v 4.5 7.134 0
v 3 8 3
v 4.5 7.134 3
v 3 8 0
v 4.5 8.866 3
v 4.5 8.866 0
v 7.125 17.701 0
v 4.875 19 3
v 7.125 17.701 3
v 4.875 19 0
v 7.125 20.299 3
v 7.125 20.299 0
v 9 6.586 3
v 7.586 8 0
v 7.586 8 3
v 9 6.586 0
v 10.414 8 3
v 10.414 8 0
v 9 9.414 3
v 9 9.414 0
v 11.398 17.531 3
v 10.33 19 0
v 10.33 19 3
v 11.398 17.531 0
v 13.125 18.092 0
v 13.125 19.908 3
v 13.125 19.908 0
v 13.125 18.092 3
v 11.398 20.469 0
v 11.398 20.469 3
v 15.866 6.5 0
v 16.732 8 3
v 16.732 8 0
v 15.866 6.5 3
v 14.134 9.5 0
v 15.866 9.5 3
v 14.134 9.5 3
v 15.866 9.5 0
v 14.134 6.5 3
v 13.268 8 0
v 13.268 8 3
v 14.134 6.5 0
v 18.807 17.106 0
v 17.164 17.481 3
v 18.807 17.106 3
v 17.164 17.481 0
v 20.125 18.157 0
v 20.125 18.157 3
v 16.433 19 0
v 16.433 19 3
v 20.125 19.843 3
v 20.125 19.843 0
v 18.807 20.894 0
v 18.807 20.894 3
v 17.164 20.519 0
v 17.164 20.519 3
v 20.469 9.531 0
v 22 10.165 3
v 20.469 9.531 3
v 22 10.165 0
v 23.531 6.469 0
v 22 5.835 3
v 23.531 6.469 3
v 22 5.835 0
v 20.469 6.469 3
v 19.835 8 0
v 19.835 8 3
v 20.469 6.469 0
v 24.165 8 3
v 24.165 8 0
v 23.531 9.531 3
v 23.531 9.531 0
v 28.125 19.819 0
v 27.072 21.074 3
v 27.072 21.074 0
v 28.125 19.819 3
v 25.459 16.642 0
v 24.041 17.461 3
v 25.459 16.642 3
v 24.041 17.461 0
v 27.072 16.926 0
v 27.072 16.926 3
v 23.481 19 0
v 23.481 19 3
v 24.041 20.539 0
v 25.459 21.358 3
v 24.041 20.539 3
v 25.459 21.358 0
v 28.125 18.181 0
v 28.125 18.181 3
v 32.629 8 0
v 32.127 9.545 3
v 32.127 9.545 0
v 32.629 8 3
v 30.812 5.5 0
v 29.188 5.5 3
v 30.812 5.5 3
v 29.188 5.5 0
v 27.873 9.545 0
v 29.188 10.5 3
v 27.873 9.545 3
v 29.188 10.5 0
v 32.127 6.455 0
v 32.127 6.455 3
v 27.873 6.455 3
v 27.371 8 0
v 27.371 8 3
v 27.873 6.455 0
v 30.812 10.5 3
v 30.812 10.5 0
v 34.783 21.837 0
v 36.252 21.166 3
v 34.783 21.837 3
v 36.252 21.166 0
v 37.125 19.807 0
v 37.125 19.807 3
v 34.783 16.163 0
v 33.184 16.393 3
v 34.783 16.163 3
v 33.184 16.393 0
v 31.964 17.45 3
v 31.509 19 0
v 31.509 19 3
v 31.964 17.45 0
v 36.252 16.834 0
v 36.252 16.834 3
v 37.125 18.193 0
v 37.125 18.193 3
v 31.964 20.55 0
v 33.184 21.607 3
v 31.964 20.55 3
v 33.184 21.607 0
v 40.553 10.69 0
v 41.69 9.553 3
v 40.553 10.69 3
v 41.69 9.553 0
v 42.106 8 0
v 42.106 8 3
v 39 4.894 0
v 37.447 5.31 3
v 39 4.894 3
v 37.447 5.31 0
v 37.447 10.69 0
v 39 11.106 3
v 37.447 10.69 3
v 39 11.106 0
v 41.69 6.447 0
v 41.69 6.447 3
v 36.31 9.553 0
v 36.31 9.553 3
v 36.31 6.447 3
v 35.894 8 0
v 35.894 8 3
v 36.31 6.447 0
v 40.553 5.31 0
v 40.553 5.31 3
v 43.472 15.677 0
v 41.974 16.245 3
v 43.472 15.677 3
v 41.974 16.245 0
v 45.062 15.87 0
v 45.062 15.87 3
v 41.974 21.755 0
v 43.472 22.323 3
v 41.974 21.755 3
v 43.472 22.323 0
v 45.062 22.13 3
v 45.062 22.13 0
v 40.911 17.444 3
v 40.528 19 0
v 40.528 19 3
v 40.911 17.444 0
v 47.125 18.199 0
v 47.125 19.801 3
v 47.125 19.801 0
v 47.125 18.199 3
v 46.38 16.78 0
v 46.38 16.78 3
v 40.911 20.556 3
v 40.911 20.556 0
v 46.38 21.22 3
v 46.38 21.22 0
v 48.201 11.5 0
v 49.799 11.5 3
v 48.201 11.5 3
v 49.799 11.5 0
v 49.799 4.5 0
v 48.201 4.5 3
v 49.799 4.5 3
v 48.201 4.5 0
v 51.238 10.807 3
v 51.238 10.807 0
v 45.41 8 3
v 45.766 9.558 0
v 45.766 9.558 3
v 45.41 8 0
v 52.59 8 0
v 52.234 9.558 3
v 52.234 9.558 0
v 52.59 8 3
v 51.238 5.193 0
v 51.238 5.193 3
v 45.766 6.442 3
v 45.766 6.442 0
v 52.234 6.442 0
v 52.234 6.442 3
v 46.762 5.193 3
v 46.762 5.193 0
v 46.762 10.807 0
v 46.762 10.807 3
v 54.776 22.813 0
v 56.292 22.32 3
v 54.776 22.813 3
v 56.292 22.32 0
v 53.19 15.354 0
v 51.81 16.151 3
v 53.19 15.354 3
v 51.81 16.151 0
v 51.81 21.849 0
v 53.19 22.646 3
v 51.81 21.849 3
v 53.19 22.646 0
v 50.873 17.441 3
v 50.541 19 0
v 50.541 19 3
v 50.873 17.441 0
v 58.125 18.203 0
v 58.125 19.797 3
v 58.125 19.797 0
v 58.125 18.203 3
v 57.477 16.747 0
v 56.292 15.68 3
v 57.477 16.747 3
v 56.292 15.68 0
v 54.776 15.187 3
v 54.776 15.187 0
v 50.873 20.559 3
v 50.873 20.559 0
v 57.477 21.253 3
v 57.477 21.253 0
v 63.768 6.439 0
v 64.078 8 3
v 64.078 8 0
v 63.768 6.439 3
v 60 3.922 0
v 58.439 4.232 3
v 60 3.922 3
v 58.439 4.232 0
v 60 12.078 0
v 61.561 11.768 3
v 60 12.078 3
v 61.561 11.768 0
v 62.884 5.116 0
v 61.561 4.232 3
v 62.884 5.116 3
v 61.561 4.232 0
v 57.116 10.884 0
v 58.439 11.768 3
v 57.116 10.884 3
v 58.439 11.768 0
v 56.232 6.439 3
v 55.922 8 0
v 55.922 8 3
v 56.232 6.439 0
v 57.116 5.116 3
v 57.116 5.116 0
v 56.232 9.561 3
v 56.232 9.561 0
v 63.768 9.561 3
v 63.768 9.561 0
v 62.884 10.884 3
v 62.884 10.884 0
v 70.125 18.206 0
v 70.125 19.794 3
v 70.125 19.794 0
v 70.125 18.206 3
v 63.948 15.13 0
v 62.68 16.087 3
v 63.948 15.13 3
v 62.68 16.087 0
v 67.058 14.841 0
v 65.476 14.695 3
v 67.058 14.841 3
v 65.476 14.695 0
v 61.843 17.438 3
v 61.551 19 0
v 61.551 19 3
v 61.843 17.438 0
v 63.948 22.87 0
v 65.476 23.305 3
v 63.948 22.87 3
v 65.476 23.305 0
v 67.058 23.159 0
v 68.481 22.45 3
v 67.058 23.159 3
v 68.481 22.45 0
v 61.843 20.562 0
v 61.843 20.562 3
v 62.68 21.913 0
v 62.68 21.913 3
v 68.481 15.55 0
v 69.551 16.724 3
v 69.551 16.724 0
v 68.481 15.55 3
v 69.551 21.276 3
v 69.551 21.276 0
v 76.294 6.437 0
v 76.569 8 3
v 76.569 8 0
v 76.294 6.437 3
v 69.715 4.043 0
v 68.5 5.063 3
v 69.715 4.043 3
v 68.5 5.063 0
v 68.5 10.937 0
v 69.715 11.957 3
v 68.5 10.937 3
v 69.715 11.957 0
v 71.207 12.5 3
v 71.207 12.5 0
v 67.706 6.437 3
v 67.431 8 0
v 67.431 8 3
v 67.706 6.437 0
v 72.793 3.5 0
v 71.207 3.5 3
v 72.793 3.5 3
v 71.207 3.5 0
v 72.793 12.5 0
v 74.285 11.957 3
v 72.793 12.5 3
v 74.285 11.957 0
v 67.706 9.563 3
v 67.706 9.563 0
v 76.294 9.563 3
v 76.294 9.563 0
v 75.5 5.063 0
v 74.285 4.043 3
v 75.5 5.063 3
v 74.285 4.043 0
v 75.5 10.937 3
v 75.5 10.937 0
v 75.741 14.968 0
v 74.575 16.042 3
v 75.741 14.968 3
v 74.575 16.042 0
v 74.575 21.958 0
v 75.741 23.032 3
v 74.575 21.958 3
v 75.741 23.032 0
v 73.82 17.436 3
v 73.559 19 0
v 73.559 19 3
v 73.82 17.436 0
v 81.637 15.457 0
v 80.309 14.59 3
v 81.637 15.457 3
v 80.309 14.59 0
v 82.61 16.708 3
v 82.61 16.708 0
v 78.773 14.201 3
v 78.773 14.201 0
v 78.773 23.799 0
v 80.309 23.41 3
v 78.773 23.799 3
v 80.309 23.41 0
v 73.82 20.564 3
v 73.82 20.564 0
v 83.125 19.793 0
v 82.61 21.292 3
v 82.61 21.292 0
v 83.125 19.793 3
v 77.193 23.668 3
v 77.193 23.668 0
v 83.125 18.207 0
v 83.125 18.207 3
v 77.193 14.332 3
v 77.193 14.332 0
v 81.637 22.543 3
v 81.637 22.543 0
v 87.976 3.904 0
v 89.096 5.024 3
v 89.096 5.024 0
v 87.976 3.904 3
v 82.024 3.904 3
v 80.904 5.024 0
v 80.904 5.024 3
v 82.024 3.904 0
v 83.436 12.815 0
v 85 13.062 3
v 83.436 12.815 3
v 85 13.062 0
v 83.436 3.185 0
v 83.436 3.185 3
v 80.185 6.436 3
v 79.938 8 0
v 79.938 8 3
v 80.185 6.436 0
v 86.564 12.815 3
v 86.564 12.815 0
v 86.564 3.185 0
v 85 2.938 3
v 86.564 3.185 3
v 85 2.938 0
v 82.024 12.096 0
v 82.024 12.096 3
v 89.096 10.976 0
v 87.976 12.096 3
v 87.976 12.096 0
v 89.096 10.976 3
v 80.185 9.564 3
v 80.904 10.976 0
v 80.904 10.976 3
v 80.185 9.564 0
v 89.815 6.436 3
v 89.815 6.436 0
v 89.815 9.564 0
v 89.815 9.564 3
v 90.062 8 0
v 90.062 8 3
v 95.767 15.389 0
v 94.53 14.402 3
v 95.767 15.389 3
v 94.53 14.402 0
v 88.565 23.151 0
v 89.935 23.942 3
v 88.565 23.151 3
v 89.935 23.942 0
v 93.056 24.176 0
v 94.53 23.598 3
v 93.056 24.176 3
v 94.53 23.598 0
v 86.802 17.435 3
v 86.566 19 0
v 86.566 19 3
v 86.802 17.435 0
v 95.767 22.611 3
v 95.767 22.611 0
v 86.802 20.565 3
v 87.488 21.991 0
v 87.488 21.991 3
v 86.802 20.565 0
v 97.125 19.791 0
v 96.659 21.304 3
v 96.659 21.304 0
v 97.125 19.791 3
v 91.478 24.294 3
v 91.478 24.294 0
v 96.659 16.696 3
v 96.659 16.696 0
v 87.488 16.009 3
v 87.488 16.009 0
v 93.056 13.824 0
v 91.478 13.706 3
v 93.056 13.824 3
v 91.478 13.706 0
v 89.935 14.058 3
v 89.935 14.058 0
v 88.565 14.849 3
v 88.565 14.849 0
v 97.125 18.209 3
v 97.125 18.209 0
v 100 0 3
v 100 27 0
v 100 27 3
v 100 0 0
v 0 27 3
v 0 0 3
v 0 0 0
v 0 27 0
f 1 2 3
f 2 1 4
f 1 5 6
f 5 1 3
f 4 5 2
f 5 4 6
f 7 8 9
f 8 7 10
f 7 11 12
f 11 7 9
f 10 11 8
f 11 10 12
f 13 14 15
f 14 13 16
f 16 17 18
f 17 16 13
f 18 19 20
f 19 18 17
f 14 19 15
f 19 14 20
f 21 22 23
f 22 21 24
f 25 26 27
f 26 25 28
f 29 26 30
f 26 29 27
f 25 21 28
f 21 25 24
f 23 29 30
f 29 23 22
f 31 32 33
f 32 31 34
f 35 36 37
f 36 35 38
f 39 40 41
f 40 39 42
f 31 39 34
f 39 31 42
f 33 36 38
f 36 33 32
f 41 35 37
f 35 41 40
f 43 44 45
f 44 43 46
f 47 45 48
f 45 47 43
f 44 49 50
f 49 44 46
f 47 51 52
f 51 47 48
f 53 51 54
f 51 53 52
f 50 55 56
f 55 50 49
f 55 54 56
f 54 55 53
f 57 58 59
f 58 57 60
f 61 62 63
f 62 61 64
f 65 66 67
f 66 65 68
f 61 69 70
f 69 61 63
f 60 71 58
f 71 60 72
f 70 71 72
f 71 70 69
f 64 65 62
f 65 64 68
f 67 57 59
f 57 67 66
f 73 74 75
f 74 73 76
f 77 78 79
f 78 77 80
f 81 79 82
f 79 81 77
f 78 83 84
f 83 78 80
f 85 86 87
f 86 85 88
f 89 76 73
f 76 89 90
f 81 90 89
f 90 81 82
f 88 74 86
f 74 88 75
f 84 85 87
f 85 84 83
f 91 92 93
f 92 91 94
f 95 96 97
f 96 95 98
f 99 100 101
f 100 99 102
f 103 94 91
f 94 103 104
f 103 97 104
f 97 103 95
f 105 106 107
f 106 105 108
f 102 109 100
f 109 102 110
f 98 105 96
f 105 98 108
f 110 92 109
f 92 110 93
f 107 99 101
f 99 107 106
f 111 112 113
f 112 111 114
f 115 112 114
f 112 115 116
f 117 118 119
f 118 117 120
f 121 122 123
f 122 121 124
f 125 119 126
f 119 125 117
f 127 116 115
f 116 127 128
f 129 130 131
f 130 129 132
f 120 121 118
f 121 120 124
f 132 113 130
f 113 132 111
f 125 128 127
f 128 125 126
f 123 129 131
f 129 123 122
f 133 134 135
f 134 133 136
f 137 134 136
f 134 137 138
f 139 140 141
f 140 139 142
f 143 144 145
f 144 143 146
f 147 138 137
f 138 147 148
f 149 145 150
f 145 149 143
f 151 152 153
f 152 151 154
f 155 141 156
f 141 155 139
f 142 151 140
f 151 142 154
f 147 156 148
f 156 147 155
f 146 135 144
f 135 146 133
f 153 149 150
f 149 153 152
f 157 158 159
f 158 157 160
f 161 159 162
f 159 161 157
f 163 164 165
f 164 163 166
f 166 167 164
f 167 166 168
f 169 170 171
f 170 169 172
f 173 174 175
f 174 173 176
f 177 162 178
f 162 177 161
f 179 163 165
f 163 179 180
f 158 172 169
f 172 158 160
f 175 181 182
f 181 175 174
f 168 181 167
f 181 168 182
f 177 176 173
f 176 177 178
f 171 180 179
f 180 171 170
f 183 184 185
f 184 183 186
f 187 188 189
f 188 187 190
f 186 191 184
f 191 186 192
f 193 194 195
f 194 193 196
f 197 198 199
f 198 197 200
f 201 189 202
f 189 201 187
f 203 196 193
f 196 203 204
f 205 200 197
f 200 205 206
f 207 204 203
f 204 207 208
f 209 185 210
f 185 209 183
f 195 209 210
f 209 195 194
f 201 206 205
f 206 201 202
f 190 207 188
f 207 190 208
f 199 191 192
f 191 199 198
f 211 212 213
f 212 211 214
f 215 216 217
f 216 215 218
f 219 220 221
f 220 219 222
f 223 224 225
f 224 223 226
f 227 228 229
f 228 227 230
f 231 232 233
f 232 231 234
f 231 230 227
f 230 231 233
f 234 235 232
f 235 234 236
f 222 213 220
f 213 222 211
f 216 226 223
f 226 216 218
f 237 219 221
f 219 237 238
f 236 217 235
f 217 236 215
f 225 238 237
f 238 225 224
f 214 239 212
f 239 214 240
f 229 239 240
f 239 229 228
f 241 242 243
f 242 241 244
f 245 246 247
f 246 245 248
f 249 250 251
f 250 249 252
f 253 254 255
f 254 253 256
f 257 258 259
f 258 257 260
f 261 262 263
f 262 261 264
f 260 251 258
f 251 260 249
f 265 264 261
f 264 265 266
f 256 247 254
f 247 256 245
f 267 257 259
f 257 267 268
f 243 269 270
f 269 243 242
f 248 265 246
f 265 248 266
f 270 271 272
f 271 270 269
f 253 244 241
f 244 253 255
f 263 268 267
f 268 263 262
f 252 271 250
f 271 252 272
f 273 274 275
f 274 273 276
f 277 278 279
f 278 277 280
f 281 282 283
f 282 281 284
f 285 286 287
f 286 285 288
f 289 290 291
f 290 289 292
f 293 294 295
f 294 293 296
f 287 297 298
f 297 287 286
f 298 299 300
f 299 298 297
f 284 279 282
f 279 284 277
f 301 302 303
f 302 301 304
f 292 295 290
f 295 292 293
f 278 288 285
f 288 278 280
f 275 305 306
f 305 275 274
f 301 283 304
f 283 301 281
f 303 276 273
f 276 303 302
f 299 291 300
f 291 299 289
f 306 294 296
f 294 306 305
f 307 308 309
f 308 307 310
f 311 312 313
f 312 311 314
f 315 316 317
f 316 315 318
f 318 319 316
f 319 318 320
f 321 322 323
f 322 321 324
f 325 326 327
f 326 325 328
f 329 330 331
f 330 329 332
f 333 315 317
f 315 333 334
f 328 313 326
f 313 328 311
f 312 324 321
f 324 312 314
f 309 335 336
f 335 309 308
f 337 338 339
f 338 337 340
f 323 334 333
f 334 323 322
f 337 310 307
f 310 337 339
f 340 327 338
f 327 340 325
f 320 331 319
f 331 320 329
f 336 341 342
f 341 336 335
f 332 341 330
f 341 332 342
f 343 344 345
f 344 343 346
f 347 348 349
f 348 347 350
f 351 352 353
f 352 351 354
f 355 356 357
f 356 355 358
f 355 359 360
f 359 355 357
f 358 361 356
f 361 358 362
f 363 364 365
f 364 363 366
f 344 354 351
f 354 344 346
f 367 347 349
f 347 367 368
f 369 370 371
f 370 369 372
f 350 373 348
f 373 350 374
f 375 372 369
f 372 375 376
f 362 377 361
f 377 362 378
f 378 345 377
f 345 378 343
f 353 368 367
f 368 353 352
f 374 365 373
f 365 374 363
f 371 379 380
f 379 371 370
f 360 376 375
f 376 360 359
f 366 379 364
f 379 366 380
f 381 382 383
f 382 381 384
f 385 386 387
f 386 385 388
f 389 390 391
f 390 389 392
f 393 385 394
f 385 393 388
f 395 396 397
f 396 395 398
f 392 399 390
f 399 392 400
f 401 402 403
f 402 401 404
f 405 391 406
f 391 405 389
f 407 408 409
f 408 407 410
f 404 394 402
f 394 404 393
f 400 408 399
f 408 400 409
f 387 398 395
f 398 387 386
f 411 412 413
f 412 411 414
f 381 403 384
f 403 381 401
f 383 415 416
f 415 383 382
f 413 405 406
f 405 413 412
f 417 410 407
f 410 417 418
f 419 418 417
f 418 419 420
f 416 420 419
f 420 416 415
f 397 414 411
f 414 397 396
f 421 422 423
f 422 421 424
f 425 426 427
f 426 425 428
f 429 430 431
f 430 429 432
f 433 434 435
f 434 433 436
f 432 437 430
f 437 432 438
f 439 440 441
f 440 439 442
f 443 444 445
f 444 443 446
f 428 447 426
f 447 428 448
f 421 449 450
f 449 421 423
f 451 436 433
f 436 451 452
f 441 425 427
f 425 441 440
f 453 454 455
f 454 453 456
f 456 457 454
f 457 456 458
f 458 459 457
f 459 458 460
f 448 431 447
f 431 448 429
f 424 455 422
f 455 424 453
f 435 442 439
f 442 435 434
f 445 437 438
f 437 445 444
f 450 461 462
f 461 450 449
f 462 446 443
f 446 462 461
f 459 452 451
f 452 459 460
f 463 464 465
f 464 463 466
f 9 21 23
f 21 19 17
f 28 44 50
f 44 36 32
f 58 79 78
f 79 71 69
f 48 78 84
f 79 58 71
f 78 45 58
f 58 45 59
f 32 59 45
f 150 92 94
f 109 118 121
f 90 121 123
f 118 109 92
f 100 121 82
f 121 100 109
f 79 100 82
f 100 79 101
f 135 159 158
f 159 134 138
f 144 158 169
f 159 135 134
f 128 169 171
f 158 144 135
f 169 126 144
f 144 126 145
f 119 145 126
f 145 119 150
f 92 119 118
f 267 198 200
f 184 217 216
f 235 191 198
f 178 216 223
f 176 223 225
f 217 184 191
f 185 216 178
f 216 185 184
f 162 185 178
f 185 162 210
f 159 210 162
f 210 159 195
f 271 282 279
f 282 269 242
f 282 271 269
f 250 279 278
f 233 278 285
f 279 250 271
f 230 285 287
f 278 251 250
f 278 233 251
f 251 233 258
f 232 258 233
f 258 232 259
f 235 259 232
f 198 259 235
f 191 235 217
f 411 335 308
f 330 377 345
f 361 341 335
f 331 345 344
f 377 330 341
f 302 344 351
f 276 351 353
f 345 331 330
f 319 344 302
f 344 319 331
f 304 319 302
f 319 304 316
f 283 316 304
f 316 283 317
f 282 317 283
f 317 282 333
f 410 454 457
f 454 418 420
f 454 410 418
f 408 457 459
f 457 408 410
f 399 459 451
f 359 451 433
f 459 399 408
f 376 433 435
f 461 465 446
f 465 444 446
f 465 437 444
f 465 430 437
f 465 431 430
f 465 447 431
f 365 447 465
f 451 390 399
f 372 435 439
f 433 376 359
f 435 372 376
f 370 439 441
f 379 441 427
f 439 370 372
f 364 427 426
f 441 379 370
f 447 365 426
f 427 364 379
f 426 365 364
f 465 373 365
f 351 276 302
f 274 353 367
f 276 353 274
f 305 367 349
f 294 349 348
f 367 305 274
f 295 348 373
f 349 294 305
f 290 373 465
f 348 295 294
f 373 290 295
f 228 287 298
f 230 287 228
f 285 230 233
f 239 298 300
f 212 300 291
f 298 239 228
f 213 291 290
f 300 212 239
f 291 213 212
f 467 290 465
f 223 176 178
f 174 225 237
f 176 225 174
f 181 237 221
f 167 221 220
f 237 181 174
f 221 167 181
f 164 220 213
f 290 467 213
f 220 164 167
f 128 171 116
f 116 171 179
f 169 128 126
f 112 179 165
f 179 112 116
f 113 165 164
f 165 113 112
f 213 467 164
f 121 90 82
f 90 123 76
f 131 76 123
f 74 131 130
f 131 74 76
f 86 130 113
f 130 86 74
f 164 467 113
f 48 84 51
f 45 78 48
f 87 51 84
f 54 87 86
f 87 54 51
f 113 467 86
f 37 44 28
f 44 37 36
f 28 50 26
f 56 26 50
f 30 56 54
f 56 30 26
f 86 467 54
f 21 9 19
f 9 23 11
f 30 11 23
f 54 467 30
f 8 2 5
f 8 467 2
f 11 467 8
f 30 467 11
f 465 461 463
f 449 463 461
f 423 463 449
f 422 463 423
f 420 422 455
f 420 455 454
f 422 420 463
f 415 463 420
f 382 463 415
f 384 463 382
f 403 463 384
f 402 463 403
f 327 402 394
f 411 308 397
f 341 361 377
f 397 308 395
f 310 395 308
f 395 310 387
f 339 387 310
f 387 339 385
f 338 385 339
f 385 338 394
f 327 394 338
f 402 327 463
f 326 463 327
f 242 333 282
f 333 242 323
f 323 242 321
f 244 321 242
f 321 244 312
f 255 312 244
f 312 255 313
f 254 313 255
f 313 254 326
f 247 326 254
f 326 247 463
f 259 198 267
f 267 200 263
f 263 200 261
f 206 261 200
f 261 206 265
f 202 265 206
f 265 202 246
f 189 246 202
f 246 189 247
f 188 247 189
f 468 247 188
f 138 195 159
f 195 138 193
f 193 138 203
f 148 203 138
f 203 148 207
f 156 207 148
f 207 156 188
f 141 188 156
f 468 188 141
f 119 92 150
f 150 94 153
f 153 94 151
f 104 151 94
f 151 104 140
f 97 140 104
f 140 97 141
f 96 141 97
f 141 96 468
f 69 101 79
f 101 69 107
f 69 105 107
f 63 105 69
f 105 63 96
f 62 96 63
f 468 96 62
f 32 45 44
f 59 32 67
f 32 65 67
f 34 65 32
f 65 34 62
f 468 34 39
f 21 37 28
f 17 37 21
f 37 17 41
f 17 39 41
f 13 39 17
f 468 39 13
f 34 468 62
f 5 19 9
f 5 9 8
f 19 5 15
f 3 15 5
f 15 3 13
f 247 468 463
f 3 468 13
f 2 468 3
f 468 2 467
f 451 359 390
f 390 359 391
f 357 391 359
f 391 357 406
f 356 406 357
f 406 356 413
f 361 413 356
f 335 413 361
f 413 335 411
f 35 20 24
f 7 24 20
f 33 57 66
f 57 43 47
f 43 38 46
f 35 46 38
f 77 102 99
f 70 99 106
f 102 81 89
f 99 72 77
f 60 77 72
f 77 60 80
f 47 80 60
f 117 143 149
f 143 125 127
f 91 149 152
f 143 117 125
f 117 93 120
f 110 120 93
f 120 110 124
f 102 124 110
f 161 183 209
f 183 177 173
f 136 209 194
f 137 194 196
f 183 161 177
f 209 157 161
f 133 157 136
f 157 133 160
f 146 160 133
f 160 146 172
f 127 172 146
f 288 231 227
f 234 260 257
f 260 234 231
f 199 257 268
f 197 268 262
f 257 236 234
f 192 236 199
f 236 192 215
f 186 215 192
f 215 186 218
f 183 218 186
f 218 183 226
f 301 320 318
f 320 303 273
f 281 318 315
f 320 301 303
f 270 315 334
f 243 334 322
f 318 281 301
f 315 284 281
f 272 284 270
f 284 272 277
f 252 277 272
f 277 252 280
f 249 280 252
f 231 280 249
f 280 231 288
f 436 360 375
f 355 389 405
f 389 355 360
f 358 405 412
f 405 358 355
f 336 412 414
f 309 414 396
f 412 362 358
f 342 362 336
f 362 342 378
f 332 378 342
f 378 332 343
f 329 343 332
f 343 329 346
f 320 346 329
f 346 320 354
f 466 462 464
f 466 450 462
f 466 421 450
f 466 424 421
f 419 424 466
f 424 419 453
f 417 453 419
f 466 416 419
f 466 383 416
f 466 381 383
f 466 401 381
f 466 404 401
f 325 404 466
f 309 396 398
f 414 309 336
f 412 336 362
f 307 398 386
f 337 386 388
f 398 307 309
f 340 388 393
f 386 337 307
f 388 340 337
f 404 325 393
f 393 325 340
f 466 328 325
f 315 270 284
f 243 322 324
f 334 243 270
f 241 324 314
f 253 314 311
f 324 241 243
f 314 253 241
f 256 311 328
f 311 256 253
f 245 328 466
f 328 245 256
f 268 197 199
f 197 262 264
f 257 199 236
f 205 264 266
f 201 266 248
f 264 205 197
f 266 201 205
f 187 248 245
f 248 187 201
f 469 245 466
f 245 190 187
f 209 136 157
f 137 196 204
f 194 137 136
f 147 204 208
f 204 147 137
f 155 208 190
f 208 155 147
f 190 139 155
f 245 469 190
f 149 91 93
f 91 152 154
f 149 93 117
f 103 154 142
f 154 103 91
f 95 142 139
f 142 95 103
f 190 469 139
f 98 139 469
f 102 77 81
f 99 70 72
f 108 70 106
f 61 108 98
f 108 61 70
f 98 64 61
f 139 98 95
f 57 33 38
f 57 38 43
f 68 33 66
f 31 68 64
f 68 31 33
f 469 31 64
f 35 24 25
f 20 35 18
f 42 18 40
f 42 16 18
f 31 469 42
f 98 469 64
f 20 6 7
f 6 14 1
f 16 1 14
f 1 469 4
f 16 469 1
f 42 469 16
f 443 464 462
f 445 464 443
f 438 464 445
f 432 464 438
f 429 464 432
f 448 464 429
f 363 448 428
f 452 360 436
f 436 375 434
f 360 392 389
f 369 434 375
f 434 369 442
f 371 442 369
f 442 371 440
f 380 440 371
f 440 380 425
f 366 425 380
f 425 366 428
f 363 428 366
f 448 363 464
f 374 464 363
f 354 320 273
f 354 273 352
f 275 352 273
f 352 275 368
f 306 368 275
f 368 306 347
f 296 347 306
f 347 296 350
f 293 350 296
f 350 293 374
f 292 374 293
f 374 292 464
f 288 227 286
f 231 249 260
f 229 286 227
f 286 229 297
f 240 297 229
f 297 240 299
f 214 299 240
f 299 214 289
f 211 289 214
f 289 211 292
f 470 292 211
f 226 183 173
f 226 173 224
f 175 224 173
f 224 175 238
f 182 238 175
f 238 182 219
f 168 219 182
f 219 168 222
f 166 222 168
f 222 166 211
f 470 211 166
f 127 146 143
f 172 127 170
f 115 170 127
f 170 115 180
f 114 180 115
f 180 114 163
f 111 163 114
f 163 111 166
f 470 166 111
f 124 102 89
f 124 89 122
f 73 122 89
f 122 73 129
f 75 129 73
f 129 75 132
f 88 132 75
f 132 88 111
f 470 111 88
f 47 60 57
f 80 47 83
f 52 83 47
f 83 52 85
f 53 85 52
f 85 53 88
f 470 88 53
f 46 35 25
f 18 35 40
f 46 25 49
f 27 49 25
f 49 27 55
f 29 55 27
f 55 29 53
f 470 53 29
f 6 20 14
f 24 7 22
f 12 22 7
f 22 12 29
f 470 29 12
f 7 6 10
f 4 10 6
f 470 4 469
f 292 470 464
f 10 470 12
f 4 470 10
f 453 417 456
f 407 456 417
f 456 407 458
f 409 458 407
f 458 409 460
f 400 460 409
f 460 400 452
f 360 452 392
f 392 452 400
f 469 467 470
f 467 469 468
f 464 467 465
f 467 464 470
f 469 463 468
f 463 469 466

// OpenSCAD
module polyhole(h, d) {
    n = max(round(2 * d),3);
    rotate([0,0,180])
        cylinder(h = h, r = (d / 2) / cos (180 / n), $fn = n);
}


difference() {
	cube(size = [100,27,3]);
    union() {
    	for(i = [1:10]) {
            translate([(i * i + i)/2 + 3 * i , 8,-1])
                polyhole(h = 5, d = i);
                
            assign(d = i + 0.5)
                translate([(d * d + d)/2 + 3 * d, 19,-1])
                    polyhole(h = 5, d = d);
    	}
    }
}
